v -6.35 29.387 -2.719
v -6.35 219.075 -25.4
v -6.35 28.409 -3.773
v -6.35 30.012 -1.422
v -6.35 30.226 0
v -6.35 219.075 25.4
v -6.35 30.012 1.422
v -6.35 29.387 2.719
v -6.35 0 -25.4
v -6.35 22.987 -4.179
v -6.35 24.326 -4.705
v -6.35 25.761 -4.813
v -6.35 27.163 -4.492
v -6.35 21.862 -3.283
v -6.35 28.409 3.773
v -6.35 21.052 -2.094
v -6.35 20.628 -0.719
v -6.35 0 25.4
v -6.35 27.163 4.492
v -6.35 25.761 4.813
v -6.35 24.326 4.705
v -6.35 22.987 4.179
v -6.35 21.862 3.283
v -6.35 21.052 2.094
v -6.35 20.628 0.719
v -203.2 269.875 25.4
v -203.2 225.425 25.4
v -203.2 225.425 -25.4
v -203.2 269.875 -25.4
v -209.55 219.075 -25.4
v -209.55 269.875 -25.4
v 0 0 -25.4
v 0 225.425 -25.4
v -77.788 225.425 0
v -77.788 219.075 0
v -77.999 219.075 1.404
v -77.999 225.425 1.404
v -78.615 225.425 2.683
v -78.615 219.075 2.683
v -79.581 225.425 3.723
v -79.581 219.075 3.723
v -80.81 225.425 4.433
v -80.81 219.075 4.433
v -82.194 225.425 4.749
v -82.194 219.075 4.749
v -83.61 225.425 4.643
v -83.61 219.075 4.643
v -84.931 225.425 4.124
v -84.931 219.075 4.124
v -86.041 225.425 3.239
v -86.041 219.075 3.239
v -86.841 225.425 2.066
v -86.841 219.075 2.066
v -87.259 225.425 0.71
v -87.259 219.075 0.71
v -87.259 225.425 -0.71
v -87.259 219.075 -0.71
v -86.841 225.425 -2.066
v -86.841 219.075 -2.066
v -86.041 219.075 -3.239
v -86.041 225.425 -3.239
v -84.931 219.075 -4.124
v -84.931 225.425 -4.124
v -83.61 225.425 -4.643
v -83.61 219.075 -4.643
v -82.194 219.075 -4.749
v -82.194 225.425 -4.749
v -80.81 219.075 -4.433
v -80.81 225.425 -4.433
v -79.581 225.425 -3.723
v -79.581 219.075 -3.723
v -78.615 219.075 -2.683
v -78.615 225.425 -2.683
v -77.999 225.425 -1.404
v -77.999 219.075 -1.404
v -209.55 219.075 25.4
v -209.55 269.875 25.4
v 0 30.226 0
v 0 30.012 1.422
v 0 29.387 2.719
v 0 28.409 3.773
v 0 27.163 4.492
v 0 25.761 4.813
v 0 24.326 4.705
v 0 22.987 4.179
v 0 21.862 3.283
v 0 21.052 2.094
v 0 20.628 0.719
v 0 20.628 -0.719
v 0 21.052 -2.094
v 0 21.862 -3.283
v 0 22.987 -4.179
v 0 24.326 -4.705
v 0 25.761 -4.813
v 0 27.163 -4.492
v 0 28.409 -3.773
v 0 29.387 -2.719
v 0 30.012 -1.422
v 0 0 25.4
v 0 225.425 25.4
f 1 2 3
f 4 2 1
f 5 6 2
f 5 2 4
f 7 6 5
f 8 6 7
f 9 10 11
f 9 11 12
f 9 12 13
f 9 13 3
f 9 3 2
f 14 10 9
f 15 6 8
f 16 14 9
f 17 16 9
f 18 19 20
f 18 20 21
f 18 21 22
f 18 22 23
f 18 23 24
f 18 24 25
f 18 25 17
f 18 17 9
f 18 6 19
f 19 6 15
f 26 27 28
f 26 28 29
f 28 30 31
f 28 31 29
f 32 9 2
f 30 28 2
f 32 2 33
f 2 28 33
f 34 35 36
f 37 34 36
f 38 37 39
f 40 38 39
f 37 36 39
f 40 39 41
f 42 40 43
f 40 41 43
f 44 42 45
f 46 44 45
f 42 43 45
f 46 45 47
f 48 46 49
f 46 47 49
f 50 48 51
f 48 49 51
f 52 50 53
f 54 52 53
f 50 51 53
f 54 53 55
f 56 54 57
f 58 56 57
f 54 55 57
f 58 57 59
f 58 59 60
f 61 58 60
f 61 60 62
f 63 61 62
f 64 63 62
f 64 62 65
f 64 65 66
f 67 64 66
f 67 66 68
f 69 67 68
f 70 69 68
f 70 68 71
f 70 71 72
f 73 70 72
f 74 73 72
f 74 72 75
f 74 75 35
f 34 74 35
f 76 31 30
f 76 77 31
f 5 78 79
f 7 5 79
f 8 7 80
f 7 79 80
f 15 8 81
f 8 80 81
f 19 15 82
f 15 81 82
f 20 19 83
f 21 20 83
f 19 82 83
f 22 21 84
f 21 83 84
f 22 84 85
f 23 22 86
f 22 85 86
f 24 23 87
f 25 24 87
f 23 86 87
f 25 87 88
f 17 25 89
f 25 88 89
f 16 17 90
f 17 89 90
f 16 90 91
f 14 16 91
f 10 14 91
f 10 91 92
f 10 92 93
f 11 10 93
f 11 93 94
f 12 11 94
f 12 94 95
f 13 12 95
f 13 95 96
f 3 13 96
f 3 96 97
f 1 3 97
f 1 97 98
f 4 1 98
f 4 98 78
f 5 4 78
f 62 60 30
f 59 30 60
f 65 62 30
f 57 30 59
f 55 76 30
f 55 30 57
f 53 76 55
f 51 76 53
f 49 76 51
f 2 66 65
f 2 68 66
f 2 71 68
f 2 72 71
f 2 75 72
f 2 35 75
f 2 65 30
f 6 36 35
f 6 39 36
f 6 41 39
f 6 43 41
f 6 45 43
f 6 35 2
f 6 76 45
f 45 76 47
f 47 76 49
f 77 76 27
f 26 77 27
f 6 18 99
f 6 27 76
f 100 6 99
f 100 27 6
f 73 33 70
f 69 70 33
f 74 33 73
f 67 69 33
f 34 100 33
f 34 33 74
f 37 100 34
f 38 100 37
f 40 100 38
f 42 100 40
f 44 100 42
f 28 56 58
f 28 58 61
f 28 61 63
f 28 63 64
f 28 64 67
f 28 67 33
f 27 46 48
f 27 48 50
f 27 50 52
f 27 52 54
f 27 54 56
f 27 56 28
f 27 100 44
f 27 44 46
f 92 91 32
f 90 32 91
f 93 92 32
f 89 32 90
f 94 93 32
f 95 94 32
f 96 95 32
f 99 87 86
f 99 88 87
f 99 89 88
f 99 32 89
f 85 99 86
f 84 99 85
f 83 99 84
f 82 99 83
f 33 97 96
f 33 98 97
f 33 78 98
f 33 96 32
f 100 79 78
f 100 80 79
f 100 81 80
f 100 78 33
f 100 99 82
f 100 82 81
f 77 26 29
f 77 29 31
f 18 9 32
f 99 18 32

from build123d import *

# Parameters (mm, degrees)
F1_DEPTH = 25.4
F2_R     = 4.7625
F3_DEPTH = 50.801
F4_R     = 4.826
F5_DEPTH = 209.551


with BuildPart() as f1:
    # F0 (on Top) → F1 (new body, symmetric)
    with BuildSketch(Plane.XY):
        Polygon((-6.35, 219.075), (-6.35, 0), (0, 0), (0, 225.425), (-203.2, 225.425), (-203.2, 269.875), (-209.55, 269.875), (-209.55, 219.075), align=None)
    extrude(amount=F1_DEPTH, both=True)

    # F2 (on face) → F3 (cut, through all)
    with BuildSketch(Plane.XZ.offset(-219.075)):
        with Locations((-82.55, 0)):
            Circle(F2_R)
    extrude(amount=-F3_DEPTH, mode=Mode.SUBTRACT)

    # F4 (on face) → F5 (cut, through all)
    with BuildSketch(Plane.YZ):
        with Locations((25.4, 0)):
            Circle(F4_R)
    extrude(amount=-F5_DEPTH, mode=Mode.SUBTRACT)


solid = f1.part
